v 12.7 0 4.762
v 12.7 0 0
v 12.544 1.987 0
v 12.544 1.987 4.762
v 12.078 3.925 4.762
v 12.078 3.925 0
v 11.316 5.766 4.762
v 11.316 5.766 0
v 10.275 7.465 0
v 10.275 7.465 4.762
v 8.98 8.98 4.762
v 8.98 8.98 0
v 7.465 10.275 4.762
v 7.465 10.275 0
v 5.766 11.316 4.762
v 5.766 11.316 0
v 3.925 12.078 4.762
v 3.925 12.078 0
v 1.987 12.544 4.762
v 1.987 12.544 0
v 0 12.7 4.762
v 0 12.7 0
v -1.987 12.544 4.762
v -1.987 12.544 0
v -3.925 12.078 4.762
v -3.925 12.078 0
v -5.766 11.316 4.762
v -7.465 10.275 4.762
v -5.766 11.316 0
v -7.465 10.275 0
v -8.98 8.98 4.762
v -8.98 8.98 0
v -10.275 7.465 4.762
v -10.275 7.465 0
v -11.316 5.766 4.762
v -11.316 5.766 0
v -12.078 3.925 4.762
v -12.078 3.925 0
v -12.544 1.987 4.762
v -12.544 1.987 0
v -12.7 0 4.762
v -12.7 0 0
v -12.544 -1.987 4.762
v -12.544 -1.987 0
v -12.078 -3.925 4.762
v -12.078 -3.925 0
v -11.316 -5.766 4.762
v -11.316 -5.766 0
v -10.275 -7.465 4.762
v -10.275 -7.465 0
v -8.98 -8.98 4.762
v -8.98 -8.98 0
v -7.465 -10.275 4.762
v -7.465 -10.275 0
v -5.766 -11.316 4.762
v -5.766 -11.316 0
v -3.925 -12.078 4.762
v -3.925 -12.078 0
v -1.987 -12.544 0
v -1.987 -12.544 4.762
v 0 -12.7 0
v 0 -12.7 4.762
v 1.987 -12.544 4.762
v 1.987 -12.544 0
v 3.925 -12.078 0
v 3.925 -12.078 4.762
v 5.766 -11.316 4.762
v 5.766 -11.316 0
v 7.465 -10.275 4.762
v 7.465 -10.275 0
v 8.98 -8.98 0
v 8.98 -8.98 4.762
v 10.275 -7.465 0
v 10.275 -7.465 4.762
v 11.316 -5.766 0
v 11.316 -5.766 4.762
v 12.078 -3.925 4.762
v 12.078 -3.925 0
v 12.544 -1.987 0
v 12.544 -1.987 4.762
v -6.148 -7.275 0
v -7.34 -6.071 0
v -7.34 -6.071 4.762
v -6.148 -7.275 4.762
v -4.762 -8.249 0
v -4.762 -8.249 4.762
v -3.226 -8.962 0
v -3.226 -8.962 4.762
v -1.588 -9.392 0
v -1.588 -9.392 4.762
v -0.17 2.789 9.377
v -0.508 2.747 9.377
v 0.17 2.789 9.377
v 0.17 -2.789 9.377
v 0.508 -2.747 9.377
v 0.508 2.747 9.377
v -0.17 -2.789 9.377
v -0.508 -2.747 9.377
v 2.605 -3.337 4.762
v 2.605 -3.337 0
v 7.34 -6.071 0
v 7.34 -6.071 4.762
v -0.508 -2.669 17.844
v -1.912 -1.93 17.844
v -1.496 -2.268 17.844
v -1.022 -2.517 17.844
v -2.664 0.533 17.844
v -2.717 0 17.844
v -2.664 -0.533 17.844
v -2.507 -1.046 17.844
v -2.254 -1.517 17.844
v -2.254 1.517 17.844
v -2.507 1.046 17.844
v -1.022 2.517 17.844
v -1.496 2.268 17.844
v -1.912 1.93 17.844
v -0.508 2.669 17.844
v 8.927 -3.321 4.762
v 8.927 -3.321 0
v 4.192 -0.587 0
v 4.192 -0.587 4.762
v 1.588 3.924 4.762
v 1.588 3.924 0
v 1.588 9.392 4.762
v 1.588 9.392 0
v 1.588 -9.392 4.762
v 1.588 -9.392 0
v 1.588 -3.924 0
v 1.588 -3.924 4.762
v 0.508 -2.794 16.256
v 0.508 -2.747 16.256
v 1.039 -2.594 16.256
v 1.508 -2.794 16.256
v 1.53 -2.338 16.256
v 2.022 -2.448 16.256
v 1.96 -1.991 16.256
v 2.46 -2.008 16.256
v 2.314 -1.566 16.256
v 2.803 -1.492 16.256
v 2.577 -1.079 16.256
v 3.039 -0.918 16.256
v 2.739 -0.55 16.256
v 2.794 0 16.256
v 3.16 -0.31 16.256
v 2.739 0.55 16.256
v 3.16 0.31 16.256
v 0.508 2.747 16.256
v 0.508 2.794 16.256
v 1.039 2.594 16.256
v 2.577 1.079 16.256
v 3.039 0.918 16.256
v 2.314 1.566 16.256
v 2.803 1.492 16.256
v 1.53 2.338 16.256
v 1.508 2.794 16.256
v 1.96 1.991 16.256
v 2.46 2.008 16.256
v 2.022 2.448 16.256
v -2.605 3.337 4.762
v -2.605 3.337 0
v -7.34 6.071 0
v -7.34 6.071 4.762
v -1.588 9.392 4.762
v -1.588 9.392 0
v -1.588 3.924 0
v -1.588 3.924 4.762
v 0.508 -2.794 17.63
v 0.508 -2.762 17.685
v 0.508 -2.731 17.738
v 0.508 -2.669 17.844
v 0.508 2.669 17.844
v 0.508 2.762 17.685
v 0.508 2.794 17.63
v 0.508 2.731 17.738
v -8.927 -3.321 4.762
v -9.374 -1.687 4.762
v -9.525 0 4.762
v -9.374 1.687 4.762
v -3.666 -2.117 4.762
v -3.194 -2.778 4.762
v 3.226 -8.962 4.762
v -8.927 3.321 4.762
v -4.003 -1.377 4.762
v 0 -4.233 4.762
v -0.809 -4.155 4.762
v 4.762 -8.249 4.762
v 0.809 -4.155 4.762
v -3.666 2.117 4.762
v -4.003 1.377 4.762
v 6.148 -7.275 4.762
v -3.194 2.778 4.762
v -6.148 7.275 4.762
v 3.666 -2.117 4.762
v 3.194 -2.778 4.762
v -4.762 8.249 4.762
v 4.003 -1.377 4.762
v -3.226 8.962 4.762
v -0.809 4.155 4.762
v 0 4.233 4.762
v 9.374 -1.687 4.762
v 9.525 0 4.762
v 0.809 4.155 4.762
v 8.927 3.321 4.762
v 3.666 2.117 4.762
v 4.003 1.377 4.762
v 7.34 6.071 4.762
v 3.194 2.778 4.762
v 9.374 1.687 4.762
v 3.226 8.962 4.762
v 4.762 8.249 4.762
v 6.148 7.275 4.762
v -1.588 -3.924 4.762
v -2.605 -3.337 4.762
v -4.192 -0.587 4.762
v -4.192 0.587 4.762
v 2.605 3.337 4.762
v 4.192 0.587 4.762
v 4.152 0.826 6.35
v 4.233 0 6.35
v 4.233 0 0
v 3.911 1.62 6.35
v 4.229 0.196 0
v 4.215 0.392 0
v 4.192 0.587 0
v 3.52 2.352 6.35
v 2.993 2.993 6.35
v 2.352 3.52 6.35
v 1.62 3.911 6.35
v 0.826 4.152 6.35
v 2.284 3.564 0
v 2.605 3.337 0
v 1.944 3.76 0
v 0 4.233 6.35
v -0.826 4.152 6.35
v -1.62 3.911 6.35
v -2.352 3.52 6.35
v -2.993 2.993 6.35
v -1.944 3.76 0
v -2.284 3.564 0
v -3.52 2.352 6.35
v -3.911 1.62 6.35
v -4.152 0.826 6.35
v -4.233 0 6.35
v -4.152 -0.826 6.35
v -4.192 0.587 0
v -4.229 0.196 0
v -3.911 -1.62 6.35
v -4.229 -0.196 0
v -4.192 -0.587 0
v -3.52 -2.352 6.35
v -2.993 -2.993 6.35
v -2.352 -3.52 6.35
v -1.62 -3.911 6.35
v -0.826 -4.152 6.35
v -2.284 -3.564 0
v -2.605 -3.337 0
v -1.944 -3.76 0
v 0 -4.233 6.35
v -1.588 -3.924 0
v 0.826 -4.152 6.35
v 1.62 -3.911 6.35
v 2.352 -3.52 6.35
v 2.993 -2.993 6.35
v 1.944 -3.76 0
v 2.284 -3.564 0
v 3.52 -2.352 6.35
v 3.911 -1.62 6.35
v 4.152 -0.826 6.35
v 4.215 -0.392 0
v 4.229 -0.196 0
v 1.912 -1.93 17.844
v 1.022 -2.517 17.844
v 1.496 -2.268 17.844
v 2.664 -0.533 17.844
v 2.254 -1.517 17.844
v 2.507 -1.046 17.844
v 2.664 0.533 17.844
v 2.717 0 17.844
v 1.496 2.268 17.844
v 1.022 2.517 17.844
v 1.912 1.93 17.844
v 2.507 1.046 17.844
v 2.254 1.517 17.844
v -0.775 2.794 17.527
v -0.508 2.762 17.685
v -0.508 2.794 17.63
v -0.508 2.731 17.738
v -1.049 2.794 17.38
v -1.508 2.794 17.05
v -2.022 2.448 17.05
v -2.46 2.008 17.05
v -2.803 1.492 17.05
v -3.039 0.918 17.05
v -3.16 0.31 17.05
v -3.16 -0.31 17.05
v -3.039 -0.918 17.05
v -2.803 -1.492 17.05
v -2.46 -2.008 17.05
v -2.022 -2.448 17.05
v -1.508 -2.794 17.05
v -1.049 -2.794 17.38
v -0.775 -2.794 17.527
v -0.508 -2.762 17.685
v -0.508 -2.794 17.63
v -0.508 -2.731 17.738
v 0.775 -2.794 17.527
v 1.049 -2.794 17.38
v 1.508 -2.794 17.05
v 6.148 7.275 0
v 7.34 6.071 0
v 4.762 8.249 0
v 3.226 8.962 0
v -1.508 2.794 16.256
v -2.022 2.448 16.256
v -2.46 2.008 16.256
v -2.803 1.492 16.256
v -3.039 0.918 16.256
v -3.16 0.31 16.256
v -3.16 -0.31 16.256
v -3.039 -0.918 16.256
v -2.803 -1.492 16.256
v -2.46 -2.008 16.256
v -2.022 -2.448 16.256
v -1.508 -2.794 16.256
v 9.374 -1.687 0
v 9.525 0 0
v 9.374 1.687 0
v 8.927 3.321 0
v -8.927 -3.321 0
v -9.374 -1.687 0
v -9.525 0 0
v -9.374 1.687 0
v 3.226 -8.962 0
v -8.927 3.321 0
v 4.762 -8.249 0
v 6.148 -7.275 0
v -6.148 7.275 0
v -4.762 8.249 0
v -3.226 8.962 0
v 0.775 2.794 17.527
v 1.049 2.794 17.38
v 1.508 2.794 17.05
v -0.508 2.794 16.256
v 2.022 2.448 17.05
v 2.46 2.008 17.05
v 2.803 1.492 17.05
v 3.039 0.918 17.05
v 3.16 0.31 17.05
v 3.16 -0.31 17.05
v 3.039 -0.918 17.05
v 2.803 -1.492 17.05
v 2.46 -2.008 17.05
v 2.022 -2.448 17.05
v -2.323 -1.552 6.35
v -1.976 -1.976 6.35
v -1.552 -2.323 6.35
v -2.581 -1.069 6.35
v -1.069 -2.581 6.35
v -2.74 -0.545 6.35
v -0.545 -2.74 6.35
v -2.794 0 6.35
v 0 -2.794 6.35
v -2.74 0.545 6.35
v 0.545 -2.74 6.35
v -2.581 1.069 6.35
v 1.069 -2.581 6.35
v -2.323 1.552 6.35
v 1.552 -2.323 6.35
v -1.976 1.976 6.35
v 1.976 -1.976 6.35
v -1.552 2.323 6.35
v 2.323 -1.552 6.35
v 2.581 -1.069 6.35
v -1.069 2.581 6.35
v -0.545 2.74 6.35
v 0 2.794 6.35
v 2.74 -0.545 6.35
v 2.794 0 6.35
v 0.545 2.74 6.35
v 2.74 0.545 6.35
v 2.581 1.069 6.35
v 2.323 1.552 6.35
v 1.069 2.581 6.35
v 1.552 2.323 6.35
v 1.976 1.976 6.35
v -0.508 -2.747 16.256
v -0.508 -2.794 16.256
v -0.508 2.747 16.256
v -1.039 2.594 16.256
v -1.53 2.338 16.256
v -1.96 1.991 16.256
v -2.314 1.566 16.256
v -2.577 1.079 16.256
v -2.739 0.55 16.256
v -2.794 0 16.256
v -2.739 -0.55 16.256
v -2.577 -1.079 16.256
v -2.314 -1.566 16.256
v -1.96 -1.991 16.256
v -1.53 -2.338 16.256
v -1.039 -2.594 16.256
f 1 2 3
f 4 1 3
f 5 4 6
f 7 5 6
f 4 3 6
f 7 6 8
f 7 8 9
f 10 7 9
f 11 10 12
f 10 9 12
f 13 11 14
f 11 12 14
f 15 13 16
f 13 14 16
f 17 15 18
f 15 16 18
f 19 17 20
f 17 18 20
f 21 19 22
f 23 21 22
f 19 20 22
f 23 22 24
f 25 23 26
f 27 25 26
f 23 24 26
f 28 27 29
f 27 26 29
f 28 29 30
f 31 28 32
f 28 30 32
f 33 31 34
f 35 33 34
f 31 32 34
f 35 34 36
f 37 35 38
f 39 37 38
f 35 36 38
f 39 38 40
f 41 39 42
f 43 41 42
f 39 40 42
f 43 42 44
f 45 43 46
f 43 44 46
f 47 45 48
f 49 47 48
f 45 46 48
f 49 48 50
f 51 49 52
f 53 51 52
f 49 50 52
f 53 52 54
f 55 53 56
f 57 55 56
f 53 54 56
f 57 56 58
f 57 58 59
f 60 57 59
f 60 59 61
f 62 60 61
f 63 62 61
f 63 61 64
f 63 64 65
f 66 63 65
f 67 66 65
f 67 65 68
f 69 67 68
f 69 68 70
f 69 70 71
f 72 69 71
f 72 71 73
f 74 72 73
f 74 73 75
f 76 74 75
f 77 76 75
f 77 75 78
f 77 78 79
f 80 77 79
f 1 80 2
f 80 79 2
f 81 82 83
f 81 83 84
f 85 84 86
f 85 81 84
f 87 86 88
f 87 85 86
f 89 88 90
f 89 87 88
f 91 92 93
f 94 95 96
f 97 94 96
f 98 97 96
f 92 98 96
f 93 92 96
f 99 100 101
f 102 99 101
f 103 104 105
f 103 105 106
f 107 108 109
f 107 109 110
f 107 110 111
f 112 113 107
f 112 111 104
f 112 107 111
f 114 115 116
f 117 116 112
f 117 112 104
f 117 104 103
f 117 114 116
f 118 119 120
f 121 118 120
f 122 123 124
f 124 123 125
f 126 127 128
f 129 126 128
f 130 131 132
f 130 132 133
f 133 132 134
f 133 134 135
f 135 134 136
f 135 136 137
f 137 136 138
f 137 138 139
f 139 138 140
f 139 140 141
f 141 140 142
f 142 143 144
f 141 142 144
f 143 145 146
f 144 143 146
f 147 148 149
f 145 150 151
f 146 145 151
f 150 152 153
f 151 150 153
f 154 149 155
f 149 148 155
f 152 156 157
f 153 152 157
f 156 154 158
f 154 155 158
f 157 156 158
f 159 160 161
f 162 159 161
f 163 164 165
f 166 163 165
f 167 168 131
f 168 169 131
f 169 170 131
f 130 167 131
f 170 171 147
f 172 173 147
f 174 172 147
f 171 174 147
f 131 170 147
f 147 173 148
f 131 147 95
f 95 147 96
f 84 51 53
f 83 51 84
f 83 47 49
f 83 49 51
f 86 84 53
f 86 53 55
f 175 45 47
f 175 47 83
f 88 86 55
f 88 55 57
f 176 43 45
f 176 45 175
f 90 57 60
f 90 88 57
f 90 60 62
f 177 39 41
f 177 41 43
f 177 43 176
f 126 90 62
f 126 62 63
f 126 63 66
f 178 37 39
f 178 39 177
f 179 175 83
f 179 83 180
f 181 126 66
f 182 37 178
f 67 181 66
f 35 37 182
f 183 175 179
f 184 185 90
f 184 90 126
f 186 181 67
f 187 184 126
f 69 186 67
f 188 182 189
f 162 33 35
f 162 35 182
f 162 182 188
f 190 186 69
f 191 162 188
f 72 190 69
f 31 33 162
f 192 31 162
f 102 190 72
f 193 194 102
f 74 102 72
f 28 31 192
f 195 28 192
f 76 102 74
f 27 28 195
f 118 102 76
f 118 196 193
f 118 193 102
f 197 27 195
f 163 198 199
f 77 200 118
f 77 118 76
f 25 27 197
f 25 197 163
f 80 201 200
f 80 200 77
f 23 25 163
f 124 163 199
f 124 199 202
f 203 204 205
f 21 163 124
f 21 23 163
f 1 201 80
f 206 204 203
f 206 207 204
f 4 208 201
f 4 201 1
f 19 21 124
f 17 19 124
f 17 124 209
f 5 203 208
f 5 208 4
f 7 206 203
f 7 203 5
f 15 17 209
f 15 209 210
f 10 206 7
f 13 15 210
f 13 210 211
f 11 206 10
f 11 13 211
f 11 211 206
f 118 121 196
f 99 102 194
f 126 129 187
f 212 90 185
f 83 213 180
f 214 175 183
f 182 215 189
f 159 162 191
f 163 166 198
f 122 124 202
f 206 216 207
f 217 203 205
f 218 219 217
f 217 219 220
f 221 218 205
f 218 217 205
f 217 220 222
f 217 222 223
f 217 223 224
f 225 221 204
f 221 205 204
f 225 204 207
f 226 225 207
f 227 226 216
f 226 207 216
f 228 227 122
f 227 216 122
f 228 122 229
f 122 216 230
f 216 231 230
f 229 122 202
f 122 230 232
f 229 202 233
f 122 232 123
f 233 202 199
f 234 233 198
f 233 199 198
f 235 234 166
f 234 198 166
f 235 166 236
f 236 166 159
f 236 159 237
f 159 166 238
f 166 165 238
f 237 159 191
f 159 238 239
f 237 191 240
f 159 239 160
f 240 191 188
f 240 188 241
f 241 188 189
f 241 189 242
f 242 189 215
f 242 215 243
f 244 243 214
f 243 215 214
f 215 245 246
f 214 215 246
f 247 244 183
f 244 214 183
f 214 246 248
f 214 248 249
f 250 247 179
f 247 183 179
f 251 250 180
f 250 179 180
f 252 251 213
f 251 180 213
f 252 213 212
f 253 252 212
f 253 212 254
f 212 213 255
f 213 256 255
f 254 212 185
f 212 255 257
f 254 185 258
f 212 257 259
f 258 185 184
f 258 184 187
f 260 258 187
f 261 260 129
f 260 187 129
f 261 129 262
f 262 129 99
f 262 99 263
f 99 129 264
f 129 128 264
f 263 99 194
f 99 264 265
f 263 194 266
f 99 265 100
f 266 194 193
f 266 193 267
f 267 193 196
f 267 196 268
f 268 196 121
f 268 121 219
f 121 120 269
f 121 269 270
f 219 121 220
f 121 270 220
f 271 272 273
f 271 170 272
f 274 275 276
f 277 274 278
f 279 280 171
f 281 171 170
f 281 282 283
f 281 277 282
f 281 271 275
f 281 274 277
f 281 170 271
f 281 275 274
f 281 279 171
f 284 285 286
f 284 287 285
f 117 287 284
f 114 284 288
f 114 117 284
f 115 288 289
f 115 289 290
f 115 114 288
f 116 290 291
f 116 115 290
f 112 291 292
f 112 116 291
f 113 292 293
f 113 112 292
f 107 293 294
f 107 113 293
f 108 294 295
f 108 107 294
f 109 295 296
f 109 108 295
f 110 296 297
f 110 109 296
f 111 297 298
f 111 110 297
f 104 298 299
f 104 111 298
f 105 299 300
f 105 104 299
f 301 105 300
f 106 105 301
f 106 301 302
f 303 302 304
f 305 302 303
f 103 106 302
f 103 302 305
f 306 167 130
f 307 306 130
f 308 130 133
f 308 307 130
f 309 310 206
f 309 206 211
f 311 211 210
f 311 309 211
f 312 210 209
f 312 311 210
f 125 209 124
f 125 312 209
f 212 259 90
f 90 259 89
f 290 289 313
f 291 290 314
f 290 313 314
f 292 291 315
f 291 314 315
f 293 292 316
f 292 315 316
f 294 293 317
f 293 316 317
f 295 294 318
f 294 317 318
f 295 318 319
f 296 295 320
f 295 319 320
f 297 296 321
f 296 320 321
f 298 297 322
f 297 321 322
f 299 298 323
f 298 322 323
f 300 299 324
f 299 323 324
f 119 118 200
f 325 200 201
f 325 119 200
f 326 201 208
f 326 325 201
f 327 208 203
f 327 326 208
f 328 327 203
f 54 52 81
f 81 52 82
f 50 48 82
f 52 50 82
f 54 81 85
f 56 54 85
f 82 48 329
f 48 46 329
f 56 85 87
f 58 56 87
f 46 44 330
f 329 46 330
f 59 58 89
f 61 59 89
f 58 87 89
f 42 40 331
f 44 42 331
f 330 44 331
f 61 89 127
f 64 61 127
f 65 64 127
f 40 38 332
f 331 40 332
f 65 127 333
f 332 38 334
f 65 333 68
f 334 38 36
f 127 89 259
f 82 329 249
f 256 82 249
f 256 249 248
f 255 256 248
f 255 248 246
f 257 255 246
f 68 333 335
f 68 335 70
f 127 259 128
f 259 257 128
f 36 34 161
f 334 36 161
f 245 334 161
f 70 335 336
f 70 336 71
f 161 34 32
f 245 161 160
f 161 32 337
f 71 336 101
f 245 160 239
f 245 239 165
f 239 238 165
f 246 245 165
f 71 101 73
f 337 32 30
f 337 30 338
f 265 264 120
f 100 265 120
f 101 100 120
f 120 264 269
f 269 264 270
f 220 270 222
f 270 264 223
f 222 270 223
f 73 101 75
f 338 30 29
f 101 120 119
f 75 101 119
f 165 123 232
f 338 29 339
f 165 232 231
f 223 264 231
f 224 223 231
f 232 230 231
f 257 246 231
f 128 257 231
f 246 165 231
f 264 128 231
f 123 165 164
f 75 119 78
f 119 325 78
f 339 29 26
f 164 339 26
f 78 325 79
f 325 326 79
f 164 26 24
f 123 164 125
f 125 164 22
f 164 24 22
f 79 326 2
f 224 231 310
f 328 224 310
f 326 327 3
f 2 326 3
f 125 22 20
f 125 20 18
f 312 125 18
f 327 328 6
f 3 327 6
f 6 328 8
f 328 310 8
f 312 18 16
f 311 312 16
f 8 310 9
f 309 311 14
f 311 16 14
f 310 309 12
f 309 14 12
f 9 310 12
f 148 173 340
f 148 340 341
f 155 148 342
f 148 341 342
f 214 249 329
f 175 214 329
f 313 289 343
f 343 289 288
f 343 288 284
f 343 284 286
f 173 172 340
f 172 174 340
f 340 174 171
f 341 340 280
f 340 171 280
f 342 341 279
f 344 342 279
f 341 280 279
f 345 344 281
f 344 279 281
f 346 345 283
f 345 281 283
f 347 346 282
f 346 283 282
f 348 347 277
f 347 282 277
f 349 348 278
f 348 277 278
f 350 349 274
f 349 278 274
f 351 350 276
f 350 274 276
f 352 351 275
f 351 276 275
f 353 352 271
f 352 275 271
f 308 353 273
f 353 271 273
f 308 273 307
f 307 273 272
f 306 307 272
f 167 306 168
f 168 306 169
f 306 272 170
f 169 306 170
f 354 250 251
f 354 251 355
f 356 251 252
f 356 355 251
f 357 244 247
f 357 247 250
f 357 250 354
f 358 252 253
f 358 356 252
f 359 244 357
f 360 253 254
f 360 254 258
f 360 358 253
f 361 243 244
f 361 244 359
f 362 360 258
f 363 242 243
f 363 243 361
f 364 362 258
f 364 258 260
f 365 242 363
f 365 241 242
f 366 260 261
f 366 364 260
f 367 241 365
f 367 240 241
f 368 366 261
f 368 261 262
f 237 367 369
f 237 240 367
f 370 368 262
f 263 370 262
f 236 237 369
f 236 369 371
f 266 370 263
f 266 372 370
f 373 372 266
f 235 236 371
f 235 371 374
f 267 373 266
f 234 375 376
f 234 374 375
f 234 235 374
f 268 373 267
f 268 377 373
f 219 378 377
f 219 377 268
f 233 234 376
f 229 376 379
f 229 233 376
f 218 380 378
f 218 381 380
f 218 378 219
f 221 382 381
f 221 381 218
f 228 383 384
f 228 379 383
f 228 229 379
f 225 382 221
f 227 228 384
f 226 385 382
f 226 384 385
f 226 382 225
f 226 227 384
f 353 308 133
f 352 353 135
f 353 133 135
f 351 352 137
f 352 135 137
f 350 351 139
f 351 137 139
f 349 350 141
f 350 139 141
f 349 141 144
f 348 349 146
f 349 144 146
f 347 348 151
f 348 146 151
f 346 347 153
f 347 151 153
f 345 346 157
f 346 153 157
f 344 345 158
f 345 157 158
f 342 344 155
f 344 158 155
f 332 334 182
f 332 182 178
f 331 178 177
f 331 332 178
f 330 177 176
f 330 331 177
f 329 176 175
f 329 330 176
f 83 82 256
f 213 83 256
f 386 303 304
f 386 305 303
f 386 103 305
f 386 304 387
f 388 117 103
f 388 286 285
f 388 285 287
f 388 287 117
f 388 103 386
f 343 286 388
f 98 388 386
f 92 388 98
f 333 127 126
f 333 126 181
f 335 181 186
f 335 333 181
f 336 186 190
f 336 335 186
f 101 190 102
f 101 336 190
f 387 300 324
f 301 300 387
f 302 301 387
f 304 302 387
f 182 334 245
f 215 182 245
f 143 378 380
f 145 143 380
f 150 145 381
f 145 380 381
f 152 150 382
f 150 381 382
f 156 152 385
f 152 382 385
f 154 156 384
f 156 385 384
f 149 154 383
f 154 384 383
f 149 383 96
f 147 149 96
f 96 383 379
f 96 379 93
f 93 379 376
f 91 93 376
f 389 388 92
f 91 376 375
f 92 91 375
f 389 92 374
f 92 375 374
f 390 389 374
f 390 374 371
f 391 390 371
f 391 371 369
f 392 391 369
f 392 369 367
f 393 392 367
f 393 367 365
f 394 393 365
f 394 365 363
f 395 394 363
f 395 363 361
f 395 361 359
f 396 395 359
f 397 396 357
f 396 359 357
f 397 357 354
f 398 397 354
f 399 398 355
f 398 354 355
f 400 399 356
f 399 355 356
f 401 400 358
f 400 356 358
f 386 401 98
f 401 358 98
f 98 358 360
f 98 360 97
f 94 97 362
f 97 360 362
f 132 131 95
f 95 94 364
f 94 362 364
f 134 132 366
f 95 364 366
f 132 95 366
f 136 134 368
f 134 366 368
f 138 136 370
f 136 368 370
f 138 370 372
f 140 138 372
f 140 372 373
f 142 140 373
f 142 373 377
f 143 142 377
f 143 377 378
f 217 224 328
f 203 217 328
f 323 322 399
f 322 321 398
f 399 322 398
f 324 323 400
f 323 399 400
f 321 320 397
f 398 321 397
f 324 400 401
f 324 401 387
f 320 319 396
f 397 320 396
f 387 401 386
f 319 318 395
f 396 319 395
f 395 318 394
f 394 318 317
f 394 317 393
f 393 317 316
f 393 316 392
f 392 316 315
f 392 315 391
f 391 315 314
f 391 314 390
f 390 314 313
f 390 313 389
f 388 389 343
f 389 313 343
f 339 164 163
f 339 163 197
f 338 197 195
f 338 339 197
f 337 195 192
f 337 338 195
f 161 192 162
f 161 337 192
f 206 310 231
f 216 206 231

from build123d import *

# Parameters (mm, degrees)
BOSS_EXTRUDE1_DEPTH = 6.35
BOSS_EXTRUDE2_DEPTH = 4.7625
SKETCH1_4_R         = 12.7
BOSS_EXTRUDE3_DEPTH = 4.7625
SKETCH2_R           = 2.794
BOSS_EXTRUDE4_DEPTH = 9.906
SKETCH3_R           = 3.175
BOSS_EXTRUDE5_DEPTH = 1.5875
SKETCH4_W           = 8.466666667
SKETCH4_H           = 6.35
CUT_EXTRUDE1_DEPTH  = 0.508
SKETCH5_W           = 6.35
SKETCH5_H           = 1.439333333
SKETCH5_W_2         = 8.466666666
CUT_EXTRUDE2_DEPTH  = 1.5875
CHAMFER1_SIZE       = 0.79375
CHAMFER1_SIZE2      = 0.458271776
CHAMFER2_SIZE       = 0.79375
CHAMFER2_SIZE2      = 0.458271776


with BuildPart() as part:
    # Sketch1 → Boss-Extrude1 (new body)
    with BuildSketch(Plane.XY):
        with BuildLine():
            ThreePointArc((1.5875, 3.924405033), (0, 4.233333333), (-1.5875, 3.924405033))
            ThreePointArc((-1.5875, 3.924405033), (-2.116666667, 3.666174209), (-2.604884453, 3.337017845))
            ThreePointArc((-2.604884453, 3.337017845), (-3.666174209, 2.116666667), (-4.192384453, 0.587387188))
            ThreePointArc((-4.192384453, 0.587387188), (-4.233333333, 0), (-4.192384453, -0.587387188))
            ThreePointArc((-4.192384453, -0.587387188), (-3.666174209, -2.116666667), (-2.604884453, -3.337017845))
            ThreePointArc((-2.604884453, -3.337017845), (-2.116666667, -3.666174209), (-1.5875, -3.924405033))
            ThreePointArc((-1.5875, -3.924405033), (0, -4.233333333), (1.5875, -3.924405033))
            ThreePointArc((1.5875, -3.924405033), (2.116666667, -3.666174209), (2.604884453, -3.337017845))
            ThreePointArc((2.604884453, -3.337017845), (3.666174209, -2.116666667), (4.192384453, -0.587387188))
            ThreePointArc((4.192384453, -0.587387188), (4.223083705, -0.294406402), (4.233333333, 0))
            ThreePointArc((4.233333333, 0), (4.223083705, 0.294406402), (4.192384453, 0.587387188))
            ThreePointArc((4.192384453, 0.587387188), (3.666174209, 2.116666667), (2.604884453, 3.337017845))
            ThreePointArc((2.604884453, 3.337017845), (2.116666667, 3.666174209), (1.5875, 3.924405033))
        make_face()
    extrude(amount=BOSS_EXTRUDE1_DEPTH)

    # Sketch1<3> → Boss-Extrude2 (add)
    with BuildSketch(Plane.XY):
        with BuildLine():
            Line((-1.5875, 9.391776656), (-1.5875, 3.924405033))
            ThreePointArc((-1.5875, 3.924405033), (0, 4.233333333), (1.5875, 3.924405033))
            Line((1.5875, 3.924405033), (1.5875, 9.391776656))
            ThreePointArc((1.5875, 9.391776656), (0, 9.525), (-1.5875, 9.391776656))
        make_face()
        with BuildLine():
            ThreePointArc((-4.192384453, 0.587387188), (-3.666174209, 2.116666667), (-2.604884453, 3.337017845))
            Line((-2.604884453, 3.337017845), (-7.33976717, 6.070703656))
            ThreePointArc((-7.33976717, 6.070703656), (-8.248891971, 4.7625), (-8.92726717, 3.321072999))
            Line((-8.92726717, 3.321072999), (-4.192384453, 0.587387188))
        make_face()
        with BuildLine():
            Line((7.33976717, 6.070703656), (2.604884453, 3.337017845))
            ThreePointArc((2.604884453, 3.337017845), (3.666174209, 2.116666667), (4.192384453, 0.587387188))
            Line((4.192384453, 0.587387188), (8.92726717, 3.321072999))
            ThreePointArc((8.92726717, 3.321072999), (8.248891971, 4.7625), (7.33976717, 6.070703656))
        make_face()
        with BuildLine():
            ThreePointArc((-2.604884453, -3.337017845), (-3.666174209, -2.116666667), (-4.192384453, -0.587387188))
            Line((-4.192384453, -0.587387188), (-8.92726717, -3.321072999))
            ThreePointArc((-8.92726717, -3.321072999), (-8.248891971, -4.7625), (-7.33976717, -6.070703656))
            Line((-7.33976717, -6.070703656), (-2.604884453, -3.337017845))
        make_face()
        with BuildLine():
            Line((8.92726717, -3.321072999), (4.192384453, -0.587387188))
            ThreePointArc((4.192384453, -0.587387188), (3.666174209, -2.116666667), (2.604884453, -3.337017845))
            Line((2.604884453, -3.337017845), (7.33976717, -6.070703656))
            ThreePointArc((7.33976717, -6.070703656), (8.248891971, -4.7625), (8.92726717, -3.321072999))
        make_face()
        with BuildLine():
            ThreePointArc((1.5875, -3.924405033), (0, -4.233333333), (-1.5875, -3.924405033))
            Line((-1.5875, -3.924405033), (-1.5875, -9.391776656))
            ThreePointArc((-1.5875, -9.391776656), (0, -9.525), (1.5875, -9.391776656))
            Line((1.5875, -9.391776656), (1.5875, -3.924405033))
        make_face()
    extrude(amount=BOSS_EXTRUDE2_DEPTH)

    # Sketch1<4> → Boss-Extrude3 (add)
    with BuildSketch(Plane.XY):
        Circle(SKETCH1_4_R)
        with BuildLine():
            ThreePointArc((-7.33976717, 6.070703656), (-4.7625, 8.248891971), (-1.5875, 9.391776656))
            ThreePointArc((-1.5875, 9.391776656), (0, 9.525), (1.5875, 9.391776656))
            ThreePointArc((1.5875, 9.391776656), (4.7625, 8.248891971), (7.33976717, 6.070703656))
            ThreePointArc((7.33976717, 6.070703656), (8.248891971, 4.7625), (8.92726717, 3.321072999))
            ThreePointArc((8.92726717, 3.321072999), (9.374375841, 1.687217414), (9.525, 0))
            ThreePointArc((9.525, 0), (9.374375841, -1.687217414), (8.92726717, -3.321072999))
            ThreePointArc((8.92726717, -3.321072999), (8.248891971, -4.7625), (7.33976717, -6.070703656))
            ThreePointArc((7.33976717, -6.070703656), (4.7625, -8.248891971), (1.5875, -9.391776656))
            ThreePointArc((1.5875, -9.391776656), (0, -9.525), (-1.5875, -9.391776656))
            ThreePointArc((-1.5875, -9.391776656), (-4.7625, -8.248891971), (-7.33976717, -6.070703656))
            ThreePointArc((-7.33976717, -6.070703656), (-8.248891971, -4.7625), (-8.92726717, -3.321072999))
            ThreePointArc((-8.92726717, -3.321072999), (-9.525, 0), (-8.92726717, 3.321072999))
            ThreePointArc((-8.92726717, 3.321072999), (-8.248891971, 4.7625), (-7.33976717, 6.070703656))
        make_face(mode=Mode.SUBTRACT)
    extrude(amount=BOSS_EXTRUDE3_DEPTH)

    # Sketch2 → Boss-Extrude4 (add)
    with BuildSketch(Plane.XY.offset(6.35)):
        Circle(SKETCH2_R)
    extrude(amount=BOSS_EXTRUDE4_DEPTH)

    # Sketch3 → Boss-Extrude5 (add)
    with BuildSketch(Plane.XY.offset(16.256)):
        Circle(SKETCH3_R)
    extrude(amount=BOSS_EXTRUDE5_DEPTH)

    # Sketch4 → Cut-Extrude1 (cut, symmetric)
    with BuildSketch(Plane(origin=(0, 0, 0), x_dir=(0, 0, -1), z_dir=(1, 0, 0))):
        with Locations((-13.610166667, 0)):
            Rectangle(SKETCH4_W, SKETCH4_H)
    extrude(amount=CUT_EXTRUDE1_DEPTH, both=True, mode=Mode.SUBTRACT)

    # Sketch5 → Cut-Extrude2 (cut)
    with BuildSketch(Plane.XY.offset(17.8435)):
        with Locations((0, 3.513666666)):
            Rectangle(SKETCH5_W, SKETCH5_H)
        with Locations((0, -3.513666666)):
            Rectangle(SKETCH5_W_2, SKETCH5_H)
    extrude(amount=-CUT_EXTRUDE2_DEPTH, mode=Mode.SUBTRACT)

    # Chamfer1
    chamfer1_edges = [part.edges().sort_by_distance(p)[0] for p in [
        (-3.175, 0, 17.8435),
    ]]
    chamfer1_side = [part.faces().sort_by_distance(p)[0] for p in [
        (-3.175, 0, 17.04975),
    ]]
    chamfer(chamfer1_edges, length=CHAMFER1_SIZE, length2=CHAMFER1_SIZE2, reference=chamfer1_side[0])

    # Chamfer2
    chamfer2_edges = [part.edges().sort_by_distance(p)[0] for p in [
        (3.175, 0, 17.8435),
    ]]
    chamfer2_side = [part.faces().sort_by_distance(p)[0] for p in [
        (3.175, 0, 17.04975),
    ]]
    chamfer(chamfer2_edges, length=CHAMFER2_SIZE, length2=CHAMFER2_SIZE2, reference=chamfer2_side[0])


solid = part.part
